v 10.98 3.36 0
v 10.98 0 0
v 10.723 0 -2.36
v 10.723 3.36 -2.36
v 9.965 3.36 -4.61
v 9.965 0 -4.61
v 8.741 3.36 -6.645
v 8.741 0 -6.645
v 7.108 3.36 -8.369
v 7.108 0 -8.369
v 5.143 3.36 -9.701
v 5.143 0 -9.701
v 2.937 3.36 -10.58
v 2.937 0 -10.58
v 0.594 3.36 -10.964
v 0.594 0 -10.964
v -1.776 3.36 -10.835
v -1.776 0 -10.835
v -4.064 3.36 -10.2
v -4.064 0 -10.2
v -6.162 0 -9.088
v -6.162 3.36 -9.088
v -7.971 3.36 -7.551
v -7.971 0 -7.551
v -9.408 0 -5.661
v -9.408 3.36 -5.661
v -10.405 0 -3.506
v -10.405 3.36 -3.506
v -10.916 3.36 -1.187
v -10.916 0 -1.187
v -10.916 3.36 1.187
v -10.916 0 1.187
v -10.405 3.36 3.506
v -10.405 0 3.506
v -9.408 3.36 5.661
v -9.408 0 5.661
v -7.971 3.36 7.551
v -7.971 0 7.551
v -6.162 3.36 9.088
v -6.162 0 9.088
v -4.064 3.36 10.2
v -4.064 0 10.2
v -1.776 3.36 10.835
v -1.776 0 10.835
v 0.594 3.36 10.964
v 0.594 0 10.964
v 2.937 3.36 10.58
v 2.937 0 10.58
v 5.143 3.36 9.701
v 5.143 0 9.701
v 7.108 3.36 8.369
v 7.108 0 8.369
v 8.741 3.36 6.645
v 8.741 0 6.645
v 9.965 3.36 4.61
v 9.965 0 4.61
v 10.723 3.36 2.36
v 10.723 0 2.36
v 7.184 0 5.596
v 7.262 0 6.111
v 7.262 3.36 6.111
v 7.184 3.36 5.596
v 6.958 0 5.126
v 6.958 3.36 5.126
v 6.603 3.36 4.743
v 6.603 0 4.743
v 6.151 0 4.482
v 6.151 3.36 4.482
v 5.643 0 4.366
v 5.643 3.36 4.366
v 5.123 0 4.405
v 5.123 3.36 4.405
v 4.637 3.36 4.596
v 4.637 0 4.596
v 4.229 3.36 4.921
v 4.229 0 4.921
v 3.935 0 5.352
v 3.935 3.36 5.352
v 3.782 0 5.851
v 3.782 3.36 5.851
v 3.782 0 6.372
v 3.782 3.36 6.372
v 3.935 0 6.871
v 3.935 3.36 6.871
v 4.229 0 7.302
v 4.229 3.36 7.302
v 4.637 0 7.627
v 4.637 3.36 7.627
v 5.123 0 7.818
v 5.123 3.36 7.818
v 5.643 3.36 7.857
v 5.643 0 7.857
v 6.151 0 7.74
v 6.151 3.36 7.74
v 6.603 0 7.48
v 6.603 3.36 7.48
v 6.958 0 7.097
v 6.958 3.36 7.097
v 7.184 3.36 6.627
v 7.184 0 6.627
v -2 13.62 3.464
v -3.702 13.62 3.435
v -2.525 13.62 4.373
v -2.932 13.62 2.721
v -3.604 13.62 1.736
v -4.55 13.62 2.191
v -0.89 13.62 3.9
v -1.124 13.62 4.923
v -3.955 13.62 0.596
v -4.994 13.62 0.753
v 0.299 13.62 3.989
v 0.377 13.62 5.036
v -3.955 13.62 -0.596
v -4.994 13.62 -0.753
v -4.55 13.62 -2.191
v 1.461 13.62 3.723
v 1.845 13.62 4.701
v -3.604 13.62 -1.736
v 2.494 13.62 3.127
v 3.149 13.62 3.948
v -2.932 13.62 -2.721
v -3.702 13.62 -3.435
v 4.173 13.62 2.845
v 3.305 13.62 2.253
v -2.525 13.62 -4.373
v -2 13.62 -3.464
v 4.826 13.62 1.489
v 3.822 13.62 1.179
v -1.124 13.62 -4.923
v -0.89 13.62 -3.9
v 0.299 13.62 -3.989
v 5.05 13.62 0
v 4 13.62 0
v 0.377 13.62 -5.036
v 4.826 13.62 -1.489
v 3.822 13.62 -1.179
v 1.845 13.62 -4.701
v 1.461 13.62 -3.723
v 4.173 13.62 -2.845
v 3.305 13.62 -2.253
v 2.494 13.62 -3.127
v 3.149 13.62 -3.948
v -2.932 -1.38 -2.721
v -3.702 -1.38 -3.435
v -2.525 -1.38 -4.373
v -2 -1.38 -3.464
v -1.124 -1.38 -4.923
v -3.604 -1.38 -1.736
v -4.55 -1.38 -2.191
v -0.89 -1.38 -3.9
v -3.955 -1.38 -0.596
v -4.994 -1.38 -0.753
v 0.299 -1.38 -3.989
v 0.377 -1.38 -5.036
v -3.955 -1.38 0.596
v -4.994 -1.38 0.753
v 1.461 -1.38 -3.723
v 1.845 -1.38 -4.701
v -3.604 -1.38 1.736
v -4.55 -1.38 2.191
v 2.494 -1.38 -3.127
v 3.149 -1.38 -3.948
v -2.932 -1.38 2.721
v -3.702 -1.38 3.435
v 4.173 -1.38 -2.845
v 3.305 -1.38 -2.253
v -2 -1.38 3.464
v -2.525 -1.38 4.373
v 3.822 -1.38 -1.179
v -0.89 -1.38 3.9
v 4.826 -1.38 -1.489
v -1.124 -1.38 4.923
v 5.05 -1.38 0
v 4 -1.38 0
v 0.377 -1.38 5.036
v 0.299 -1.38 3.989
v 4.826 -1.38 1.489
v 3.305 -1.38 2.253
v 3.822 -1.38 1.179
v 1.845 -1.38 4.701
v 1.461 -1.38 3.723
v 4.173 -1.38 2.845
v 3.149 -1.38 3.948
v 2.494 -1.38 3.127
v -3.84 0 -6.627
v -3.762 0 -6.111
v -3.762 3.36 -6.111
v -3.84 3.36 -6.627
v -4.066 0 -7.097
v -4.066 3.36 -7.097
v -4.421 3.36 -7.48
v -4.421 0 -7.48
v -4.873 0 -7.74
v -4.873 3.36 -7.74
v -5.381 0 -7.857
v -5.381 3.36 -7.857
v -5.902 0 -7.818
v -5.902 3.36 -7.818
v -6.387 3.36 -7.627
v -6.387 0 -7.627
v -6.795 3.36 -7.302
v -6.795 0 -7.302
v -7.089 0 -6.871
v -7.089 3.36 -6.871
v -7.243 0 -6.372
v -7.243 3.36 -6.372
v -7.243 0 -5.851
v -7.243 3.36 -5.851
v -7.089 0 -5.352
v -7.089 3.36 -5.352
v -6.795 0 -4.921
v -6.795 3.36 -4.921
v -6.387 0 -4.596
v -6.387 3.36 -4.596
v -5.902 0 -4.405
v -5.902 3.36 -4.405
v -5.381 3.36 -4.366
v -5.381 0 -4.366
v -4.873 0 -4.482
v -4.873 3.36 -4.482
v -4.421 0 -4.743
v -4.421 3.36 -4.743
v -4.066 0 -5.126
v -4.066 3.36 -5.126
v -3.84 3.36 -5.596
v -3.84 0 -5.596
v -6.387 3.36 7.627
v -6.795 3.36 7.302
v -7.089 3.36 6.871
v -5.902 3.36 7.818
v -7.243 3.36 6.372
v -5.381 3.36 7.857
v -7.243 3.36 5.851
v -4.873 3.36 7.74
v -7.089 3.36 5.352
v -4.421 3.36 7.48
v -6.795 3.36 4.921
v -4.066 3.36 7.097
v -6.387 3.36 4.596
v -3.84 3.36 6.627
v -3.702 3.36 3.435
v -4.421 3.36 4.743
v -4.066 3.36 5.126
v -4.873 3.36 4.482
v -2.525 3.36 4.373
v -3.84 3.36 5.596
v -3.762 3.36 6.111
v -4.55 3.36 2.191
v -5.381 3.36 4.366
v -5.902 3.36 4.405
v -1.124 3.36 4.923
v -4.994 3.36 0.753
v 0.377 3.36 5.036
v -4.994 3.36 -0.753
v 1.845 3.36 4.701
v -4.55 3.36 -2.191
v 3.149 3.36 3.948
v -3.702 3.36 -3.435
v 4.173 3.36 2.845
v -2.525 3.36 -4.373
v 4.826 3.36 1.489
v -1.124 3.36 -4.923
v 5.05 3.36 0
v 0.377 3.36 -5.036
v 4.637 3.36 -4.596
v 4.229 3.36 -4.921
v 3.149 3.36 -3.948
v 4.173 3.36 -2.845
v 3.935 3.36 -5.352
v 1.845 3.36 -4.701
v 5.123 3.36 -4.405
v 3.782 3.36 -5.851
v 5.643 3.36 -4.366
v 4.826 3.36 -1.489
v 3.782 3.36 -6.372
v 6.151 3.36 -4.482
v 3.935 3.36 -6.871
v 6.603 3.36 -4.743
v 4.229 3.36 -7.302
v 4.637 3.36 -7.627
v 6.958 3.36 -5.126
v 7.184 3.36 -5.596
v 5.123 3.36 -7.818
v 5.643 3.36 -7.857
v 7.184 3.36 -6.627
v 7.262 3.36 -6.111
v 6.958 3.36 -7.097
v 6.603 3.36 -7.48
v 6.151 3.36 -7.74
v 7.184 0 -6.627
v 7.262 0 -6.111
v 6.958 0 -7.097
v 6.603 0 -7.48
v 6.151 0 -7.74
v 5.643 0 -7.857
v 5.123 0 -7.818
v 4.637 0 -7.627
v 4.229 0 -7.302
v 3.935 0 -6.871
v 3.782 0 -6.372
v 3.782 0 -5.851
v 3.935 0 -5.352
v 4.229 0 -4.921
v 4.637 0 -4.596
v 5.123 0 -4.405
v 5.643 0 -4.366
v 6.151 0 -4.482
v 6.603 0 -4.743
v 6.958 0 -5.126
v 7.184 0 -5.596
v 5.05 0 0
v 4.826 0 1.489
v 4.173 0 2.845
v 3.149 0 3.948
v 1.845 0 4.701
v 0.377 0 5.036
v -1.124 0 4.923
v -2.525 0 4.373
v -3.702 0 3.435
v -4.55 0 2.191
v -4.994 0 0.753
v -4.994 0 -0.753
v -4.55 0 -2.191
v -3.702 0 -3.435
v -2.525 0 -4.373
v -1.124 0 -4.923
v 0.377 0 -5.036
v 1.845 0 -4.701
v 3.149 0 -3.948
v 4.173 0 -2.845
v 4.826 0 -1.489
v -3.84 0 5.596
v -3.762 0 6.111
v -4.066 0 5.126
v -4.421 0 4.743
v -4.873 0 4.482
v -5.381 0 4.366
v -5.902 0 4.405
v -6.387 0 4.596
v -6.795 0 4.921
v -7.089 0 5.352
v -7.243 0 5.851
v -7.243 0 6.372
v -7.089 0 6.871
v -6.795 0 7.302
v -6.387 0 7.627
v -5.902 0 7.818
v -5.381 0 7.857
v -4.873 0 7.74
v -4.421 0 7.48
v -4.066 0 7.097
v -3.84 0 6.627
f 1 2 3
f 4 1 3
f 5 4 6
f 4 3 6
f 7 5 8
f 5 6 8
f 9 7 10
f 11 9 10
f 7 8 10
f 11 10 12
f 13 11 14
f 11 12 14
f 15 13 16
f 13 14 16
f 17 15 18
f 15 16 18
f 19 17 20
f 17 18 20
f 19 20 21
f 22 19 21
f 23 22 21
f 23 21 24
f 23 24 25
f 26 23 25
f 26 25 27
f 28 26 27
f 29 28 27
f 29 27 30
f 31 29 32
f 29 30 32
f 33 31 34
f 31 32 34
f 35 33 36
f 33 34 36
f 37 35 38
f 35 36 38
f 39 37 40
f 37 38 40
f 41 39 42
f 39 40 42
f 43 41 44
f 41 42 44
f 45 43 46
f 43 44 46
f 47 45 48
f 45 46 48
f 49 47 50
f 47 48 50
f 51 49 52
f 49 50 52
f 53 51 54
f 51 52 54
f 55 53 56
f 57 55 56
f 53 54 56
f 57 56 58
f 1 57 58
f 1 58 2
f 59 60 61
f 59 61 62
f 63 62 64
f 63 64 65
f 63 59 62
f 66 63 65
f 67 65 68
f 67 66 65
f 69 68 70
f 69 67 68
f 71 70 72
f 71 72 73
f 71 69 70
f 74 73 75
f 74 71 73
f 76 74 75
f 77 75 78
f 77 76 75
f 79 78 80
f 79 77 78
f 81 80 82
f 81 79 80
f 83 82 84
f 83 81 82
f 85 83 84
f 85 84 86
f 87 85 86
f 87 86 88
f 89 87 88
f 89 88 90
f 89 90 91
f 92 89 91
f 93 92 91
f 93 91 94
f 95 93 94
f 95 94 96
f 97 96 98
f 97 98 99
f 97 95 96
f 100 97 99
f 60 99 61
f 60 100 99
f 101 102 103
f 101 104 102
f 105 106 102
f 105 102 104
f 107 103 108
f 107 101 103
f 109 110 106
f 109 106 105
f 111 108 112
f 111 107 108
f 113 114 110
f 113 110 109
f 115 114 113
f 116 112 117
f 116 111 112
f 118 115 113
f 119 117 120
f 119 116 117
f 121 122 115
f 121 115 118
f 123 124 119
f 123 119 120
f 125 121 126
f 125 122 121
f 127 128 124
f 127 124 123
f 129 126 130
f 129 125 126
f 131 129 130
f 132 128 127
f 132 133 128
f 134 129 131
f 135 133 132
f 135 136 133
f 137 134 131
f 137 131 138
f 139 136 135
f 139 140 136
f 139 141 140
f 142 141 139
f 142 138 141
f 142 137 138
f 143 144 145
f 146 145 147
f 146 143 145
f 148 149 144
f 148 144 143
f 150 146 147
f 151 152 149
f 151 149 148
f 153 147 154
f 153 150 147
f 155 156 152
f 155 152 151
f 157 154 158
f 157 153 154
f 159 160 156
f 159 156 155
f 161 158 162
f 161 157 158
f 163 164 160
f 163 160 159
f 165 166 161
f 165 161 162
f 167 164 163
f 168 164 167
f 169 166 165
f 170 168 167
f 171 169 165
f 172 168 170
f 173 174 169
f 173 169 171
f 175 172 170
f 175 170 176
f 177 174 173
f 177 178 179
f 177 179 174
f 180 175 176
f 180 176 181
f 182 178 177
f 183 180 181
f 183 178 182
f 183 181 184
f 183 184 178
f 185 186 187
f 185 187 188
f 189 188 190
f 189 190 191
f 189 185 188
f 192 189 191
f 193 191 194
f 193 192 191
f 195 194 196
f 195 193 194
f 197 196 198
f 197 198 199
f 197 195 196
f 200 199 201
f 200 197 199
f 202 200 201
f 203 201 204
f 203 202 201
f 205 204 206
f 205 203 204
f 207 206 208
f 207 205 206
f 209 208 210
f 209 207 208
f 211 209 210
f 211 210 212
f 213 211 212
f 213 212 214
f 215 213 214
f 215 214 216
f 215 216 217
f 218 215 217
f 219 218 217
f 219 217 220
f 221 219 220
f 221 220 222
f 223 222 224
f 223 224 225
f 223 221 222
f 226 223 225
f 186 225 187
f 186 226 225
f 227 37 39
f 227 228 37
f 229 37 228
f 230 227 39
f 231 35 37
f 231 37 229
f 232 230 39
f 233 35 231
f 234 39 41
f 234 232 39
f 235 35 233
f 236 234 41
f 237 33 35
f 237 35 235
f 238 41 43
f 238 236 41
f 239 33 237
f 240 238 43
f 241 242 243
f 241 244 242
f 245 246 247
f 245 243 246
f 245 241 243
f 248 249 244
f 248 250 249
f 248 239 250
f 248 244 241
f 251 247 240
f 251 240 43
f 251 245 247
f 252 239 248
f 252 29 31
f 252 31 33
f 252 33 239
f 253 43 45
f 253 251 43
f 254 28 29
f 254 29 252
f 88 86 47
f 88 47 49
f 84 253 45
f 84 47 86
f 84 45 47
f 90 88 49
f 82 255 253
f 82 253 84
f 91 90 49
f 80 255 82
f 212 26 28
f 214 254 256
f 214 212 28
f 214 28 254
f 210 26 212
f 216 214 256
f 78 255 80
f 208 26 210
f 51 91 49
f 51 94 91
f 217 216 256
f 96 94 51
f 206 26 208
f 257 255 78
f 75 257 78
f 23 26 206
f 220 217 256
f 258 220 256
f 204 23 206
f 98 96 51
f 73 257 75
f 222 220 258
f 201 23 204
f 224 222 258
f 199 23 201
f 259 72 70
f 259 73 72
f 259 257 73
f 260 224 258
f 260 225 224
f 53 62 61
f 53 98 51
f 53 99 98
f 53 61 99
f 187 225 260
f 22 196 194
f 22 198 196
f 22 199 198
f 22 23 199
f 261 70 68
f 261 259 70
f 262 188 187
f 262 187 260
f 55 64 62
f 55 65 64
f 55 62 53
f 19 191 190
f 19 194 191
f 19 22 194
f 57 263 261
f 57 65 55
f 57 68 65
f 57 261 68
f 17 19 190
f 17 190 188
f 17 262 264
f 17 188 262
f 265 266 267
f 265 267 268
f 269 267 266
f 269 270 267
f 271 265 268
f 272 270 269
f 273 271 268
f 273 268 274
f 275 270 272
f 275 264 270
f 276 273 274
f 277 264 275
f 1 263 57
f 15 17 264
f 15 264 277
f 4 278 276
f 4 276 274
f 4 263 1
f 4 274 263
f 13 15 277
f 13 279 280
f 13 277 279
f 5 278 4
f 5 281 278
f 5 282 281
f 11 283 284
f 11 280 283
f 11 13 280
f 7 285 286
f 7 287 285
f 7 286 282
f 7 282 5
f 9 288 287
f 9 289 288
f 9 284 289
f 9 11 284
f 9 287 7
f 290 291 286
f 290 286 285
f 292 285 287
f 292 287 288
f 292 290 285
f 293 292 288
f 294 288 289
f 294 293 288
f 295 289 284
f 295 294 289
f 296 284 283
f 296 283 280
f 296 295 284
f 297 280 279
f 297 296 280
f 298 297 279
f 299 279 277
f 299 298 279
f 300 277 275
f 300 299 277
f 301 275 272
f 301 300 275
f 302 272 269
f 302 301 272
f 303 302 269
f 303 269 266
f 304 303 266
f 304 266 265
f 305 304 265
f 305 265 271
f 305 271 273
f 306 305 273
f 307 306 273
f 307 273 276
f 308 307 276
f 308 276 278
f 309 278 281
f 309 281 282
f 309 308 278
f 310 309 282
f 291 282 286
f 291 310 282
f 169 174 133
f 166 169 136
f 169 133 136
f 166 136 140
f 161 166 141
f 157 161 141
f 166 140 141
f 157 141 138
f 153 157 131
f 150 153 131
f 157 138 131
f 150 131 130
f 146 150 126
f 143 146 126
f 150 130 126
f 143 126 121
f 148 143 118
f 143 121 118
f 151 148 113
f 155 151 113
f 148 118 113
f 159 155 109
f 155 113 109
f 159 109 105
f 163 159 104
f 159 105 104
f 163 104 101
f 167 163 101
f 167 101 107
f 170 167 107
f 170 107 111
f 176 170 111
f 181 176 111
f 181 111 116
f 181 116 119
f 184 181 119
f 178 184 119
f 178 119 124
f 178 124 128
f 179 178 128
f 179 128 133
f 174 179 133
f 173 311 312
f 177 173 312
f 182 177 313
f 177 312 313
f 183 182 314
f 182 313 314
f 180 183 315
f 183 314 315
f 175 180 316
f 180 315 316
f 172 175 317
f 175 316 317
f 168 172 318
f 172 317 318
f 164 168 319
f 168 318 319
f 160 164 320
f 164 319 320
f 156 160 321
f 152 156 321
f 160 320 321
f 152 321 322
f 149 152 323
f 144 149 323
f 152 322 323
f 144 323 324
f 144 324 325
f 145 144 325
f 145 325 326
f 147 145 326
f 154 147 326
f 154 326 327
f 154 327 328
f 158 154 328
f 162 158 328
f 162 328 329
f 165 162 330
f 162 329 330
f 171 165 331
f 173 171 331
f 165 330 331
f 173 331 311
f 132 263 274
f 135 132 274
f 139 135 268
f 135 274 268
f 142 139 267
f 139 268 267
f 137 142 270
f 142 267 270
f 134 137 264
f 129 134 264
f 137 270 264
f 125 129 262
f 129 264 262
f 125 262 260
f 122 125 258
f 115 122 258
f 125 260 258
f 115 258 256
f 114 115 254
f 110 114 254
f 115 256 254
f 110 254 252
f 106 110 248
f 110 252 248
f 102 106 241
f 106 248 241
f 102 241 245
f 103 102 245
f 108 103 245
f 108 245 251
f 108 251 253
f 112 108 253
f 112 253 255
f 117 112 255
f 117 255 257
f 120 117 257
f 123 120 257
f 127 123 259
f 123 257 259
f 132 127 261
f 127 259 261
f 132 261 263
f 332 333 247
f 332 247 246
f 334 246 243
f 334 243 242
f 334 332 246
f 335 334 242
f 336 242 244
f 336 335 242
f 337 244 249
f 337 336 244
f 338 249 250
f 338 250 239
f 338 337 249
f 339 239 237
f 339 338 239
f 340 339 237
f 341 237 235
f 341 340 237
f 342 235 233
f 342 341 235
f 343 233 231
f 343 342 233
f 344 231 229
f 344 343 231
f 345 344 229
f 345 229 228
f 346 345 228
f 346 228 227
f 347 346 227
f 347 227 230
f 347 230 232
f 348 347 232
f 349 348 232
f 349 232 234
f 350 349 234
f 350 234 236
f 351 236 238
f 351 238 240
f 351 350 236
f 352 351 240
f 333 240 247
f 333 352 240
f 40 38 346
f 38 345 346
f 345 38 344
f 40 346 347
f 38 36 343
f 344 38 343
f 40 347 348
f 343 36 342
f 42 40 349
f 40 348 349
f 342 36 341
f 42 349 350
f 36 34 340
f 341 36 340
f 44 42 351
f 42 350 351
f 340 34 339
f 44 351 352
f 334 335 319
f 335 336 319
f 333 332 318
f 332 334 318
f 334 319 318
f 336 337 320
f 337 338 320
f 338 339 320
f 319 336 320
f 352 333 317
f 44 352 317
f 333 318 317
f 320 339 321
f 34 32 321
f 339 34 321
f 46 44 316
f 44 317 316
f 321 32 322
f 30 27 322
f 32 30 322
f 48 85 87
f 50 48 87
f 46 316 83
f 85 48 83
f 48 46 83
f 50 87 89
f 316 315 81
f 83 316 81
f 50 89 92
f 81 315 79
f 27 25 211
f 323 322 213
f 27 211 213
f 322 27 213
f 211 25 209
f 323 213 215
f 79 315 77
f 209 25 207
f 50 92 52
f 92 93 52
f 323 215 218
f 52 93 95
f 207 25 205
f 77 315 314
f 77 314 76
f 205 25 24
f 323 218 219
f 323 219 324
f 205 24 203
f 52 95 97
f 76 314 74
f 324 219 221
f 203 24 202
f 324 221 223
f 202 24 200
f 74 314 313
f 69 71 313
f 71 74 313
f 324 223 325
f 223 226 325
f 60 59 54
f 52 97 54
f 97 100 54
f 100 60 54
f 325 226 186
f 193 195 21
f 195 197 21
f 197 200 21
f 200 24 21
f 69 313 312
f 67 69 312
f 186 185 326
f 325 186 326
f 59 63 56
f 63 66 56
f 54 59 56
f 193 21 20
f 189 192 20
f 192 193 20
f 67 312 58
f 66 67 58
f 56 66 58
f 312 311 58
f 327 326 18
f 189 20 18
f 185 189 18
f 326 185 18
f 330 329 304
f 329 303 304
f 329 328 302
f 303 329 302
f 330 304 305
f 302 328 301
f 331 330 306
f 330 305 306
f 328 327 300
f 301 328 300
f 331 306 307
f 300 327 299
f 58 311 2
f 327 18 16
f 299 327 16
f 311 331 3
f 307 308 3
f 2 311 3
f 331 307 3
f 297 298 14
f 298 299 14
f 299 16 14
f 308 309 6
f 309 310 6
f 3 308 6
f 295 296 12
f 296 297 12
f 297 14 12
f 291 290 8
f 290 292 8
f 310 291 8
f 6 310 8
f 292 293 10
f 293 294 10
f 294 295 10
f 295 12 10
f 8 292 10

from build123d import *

# Parameters (mm, degrees)
CROQUIS2_R              = 10.98
CROQUIS2_R_2            = 1.75
SALIENTE_EXTRUIR1_DEPTH = 3.36
CROQUIS3_R              = 5.05
SALIENTE_EXTRUIR2_DEPTH = 10.26
CROQUIS4_R              = 5.05
SALIENTE_EXTRUIR3_DEPTH = 1.38
CROQUIS5_R              = 4
CORTAR_EXTRUIR1_DEPTH   = 16


with BuildPart() as part:
    # Croquis2 → Saliente-Extruir1 (new body)
    with BuildSketch(Plane(origin=(0, 0, 0), x_dir=(1, 0, 0), z_dir=(0, 1, 0))):
        Circle(CROQUIS2_R)
        with Locations((-5.512093558, 6.111442105)):
            Circle(CROQUIS2_R_2, mode=Mode.SUBTRACT)
        with Locations((-5.512093558, -6.111442105)):
            Circle(CROQUIS2_R_2, mode=Mode.SUBTRACT)
        with Locations((5.512093558, -6.111442105)):
            Circle(CROQUIS2_R_2, mode=Mode.SUBTRACT)
        with Locations((5.512093558, 6.111442105)):
            Circle(CROQUIS2_R_2, mode=Mode.SUBTRACT)
    extrude(amount=SALIENTE_EXTRUIR1_DEPTH)

    # Croquis3 → Saliente-Extruir2 (add)
    with BuildSketch(Plane(origin=(0, 3.36, 0), x_dir=(1, 0, 0), z_dir=(0, 1, 0))):
        Circle(CROQUIS3_R)
    extrude(amount=SALIENTE_EXTRUIR2_DEPTH)

    # Croquis4 → Saliente-Extruir3 (add)
    with BuildSketch(Plane.XZ):
        Circle(CROQUIS4_R)
    extrude(amount=SALIENTE_EXTRUIR3_DEPTH)

    # Croquis5 → Cortar-Extruir1 (cut, through all)
    with BuildSketch(Plane(origin=(0, 13.62, 0), x_dir=(1, 0, 0), z_dir=(0, 1, 0))):
        Circle(CROQUIS5_R)
    extrude(amount=-CORTAR_EXTRUIR1_DEPTH, mode=Mode.SUBTRACT)


solid = part.part
